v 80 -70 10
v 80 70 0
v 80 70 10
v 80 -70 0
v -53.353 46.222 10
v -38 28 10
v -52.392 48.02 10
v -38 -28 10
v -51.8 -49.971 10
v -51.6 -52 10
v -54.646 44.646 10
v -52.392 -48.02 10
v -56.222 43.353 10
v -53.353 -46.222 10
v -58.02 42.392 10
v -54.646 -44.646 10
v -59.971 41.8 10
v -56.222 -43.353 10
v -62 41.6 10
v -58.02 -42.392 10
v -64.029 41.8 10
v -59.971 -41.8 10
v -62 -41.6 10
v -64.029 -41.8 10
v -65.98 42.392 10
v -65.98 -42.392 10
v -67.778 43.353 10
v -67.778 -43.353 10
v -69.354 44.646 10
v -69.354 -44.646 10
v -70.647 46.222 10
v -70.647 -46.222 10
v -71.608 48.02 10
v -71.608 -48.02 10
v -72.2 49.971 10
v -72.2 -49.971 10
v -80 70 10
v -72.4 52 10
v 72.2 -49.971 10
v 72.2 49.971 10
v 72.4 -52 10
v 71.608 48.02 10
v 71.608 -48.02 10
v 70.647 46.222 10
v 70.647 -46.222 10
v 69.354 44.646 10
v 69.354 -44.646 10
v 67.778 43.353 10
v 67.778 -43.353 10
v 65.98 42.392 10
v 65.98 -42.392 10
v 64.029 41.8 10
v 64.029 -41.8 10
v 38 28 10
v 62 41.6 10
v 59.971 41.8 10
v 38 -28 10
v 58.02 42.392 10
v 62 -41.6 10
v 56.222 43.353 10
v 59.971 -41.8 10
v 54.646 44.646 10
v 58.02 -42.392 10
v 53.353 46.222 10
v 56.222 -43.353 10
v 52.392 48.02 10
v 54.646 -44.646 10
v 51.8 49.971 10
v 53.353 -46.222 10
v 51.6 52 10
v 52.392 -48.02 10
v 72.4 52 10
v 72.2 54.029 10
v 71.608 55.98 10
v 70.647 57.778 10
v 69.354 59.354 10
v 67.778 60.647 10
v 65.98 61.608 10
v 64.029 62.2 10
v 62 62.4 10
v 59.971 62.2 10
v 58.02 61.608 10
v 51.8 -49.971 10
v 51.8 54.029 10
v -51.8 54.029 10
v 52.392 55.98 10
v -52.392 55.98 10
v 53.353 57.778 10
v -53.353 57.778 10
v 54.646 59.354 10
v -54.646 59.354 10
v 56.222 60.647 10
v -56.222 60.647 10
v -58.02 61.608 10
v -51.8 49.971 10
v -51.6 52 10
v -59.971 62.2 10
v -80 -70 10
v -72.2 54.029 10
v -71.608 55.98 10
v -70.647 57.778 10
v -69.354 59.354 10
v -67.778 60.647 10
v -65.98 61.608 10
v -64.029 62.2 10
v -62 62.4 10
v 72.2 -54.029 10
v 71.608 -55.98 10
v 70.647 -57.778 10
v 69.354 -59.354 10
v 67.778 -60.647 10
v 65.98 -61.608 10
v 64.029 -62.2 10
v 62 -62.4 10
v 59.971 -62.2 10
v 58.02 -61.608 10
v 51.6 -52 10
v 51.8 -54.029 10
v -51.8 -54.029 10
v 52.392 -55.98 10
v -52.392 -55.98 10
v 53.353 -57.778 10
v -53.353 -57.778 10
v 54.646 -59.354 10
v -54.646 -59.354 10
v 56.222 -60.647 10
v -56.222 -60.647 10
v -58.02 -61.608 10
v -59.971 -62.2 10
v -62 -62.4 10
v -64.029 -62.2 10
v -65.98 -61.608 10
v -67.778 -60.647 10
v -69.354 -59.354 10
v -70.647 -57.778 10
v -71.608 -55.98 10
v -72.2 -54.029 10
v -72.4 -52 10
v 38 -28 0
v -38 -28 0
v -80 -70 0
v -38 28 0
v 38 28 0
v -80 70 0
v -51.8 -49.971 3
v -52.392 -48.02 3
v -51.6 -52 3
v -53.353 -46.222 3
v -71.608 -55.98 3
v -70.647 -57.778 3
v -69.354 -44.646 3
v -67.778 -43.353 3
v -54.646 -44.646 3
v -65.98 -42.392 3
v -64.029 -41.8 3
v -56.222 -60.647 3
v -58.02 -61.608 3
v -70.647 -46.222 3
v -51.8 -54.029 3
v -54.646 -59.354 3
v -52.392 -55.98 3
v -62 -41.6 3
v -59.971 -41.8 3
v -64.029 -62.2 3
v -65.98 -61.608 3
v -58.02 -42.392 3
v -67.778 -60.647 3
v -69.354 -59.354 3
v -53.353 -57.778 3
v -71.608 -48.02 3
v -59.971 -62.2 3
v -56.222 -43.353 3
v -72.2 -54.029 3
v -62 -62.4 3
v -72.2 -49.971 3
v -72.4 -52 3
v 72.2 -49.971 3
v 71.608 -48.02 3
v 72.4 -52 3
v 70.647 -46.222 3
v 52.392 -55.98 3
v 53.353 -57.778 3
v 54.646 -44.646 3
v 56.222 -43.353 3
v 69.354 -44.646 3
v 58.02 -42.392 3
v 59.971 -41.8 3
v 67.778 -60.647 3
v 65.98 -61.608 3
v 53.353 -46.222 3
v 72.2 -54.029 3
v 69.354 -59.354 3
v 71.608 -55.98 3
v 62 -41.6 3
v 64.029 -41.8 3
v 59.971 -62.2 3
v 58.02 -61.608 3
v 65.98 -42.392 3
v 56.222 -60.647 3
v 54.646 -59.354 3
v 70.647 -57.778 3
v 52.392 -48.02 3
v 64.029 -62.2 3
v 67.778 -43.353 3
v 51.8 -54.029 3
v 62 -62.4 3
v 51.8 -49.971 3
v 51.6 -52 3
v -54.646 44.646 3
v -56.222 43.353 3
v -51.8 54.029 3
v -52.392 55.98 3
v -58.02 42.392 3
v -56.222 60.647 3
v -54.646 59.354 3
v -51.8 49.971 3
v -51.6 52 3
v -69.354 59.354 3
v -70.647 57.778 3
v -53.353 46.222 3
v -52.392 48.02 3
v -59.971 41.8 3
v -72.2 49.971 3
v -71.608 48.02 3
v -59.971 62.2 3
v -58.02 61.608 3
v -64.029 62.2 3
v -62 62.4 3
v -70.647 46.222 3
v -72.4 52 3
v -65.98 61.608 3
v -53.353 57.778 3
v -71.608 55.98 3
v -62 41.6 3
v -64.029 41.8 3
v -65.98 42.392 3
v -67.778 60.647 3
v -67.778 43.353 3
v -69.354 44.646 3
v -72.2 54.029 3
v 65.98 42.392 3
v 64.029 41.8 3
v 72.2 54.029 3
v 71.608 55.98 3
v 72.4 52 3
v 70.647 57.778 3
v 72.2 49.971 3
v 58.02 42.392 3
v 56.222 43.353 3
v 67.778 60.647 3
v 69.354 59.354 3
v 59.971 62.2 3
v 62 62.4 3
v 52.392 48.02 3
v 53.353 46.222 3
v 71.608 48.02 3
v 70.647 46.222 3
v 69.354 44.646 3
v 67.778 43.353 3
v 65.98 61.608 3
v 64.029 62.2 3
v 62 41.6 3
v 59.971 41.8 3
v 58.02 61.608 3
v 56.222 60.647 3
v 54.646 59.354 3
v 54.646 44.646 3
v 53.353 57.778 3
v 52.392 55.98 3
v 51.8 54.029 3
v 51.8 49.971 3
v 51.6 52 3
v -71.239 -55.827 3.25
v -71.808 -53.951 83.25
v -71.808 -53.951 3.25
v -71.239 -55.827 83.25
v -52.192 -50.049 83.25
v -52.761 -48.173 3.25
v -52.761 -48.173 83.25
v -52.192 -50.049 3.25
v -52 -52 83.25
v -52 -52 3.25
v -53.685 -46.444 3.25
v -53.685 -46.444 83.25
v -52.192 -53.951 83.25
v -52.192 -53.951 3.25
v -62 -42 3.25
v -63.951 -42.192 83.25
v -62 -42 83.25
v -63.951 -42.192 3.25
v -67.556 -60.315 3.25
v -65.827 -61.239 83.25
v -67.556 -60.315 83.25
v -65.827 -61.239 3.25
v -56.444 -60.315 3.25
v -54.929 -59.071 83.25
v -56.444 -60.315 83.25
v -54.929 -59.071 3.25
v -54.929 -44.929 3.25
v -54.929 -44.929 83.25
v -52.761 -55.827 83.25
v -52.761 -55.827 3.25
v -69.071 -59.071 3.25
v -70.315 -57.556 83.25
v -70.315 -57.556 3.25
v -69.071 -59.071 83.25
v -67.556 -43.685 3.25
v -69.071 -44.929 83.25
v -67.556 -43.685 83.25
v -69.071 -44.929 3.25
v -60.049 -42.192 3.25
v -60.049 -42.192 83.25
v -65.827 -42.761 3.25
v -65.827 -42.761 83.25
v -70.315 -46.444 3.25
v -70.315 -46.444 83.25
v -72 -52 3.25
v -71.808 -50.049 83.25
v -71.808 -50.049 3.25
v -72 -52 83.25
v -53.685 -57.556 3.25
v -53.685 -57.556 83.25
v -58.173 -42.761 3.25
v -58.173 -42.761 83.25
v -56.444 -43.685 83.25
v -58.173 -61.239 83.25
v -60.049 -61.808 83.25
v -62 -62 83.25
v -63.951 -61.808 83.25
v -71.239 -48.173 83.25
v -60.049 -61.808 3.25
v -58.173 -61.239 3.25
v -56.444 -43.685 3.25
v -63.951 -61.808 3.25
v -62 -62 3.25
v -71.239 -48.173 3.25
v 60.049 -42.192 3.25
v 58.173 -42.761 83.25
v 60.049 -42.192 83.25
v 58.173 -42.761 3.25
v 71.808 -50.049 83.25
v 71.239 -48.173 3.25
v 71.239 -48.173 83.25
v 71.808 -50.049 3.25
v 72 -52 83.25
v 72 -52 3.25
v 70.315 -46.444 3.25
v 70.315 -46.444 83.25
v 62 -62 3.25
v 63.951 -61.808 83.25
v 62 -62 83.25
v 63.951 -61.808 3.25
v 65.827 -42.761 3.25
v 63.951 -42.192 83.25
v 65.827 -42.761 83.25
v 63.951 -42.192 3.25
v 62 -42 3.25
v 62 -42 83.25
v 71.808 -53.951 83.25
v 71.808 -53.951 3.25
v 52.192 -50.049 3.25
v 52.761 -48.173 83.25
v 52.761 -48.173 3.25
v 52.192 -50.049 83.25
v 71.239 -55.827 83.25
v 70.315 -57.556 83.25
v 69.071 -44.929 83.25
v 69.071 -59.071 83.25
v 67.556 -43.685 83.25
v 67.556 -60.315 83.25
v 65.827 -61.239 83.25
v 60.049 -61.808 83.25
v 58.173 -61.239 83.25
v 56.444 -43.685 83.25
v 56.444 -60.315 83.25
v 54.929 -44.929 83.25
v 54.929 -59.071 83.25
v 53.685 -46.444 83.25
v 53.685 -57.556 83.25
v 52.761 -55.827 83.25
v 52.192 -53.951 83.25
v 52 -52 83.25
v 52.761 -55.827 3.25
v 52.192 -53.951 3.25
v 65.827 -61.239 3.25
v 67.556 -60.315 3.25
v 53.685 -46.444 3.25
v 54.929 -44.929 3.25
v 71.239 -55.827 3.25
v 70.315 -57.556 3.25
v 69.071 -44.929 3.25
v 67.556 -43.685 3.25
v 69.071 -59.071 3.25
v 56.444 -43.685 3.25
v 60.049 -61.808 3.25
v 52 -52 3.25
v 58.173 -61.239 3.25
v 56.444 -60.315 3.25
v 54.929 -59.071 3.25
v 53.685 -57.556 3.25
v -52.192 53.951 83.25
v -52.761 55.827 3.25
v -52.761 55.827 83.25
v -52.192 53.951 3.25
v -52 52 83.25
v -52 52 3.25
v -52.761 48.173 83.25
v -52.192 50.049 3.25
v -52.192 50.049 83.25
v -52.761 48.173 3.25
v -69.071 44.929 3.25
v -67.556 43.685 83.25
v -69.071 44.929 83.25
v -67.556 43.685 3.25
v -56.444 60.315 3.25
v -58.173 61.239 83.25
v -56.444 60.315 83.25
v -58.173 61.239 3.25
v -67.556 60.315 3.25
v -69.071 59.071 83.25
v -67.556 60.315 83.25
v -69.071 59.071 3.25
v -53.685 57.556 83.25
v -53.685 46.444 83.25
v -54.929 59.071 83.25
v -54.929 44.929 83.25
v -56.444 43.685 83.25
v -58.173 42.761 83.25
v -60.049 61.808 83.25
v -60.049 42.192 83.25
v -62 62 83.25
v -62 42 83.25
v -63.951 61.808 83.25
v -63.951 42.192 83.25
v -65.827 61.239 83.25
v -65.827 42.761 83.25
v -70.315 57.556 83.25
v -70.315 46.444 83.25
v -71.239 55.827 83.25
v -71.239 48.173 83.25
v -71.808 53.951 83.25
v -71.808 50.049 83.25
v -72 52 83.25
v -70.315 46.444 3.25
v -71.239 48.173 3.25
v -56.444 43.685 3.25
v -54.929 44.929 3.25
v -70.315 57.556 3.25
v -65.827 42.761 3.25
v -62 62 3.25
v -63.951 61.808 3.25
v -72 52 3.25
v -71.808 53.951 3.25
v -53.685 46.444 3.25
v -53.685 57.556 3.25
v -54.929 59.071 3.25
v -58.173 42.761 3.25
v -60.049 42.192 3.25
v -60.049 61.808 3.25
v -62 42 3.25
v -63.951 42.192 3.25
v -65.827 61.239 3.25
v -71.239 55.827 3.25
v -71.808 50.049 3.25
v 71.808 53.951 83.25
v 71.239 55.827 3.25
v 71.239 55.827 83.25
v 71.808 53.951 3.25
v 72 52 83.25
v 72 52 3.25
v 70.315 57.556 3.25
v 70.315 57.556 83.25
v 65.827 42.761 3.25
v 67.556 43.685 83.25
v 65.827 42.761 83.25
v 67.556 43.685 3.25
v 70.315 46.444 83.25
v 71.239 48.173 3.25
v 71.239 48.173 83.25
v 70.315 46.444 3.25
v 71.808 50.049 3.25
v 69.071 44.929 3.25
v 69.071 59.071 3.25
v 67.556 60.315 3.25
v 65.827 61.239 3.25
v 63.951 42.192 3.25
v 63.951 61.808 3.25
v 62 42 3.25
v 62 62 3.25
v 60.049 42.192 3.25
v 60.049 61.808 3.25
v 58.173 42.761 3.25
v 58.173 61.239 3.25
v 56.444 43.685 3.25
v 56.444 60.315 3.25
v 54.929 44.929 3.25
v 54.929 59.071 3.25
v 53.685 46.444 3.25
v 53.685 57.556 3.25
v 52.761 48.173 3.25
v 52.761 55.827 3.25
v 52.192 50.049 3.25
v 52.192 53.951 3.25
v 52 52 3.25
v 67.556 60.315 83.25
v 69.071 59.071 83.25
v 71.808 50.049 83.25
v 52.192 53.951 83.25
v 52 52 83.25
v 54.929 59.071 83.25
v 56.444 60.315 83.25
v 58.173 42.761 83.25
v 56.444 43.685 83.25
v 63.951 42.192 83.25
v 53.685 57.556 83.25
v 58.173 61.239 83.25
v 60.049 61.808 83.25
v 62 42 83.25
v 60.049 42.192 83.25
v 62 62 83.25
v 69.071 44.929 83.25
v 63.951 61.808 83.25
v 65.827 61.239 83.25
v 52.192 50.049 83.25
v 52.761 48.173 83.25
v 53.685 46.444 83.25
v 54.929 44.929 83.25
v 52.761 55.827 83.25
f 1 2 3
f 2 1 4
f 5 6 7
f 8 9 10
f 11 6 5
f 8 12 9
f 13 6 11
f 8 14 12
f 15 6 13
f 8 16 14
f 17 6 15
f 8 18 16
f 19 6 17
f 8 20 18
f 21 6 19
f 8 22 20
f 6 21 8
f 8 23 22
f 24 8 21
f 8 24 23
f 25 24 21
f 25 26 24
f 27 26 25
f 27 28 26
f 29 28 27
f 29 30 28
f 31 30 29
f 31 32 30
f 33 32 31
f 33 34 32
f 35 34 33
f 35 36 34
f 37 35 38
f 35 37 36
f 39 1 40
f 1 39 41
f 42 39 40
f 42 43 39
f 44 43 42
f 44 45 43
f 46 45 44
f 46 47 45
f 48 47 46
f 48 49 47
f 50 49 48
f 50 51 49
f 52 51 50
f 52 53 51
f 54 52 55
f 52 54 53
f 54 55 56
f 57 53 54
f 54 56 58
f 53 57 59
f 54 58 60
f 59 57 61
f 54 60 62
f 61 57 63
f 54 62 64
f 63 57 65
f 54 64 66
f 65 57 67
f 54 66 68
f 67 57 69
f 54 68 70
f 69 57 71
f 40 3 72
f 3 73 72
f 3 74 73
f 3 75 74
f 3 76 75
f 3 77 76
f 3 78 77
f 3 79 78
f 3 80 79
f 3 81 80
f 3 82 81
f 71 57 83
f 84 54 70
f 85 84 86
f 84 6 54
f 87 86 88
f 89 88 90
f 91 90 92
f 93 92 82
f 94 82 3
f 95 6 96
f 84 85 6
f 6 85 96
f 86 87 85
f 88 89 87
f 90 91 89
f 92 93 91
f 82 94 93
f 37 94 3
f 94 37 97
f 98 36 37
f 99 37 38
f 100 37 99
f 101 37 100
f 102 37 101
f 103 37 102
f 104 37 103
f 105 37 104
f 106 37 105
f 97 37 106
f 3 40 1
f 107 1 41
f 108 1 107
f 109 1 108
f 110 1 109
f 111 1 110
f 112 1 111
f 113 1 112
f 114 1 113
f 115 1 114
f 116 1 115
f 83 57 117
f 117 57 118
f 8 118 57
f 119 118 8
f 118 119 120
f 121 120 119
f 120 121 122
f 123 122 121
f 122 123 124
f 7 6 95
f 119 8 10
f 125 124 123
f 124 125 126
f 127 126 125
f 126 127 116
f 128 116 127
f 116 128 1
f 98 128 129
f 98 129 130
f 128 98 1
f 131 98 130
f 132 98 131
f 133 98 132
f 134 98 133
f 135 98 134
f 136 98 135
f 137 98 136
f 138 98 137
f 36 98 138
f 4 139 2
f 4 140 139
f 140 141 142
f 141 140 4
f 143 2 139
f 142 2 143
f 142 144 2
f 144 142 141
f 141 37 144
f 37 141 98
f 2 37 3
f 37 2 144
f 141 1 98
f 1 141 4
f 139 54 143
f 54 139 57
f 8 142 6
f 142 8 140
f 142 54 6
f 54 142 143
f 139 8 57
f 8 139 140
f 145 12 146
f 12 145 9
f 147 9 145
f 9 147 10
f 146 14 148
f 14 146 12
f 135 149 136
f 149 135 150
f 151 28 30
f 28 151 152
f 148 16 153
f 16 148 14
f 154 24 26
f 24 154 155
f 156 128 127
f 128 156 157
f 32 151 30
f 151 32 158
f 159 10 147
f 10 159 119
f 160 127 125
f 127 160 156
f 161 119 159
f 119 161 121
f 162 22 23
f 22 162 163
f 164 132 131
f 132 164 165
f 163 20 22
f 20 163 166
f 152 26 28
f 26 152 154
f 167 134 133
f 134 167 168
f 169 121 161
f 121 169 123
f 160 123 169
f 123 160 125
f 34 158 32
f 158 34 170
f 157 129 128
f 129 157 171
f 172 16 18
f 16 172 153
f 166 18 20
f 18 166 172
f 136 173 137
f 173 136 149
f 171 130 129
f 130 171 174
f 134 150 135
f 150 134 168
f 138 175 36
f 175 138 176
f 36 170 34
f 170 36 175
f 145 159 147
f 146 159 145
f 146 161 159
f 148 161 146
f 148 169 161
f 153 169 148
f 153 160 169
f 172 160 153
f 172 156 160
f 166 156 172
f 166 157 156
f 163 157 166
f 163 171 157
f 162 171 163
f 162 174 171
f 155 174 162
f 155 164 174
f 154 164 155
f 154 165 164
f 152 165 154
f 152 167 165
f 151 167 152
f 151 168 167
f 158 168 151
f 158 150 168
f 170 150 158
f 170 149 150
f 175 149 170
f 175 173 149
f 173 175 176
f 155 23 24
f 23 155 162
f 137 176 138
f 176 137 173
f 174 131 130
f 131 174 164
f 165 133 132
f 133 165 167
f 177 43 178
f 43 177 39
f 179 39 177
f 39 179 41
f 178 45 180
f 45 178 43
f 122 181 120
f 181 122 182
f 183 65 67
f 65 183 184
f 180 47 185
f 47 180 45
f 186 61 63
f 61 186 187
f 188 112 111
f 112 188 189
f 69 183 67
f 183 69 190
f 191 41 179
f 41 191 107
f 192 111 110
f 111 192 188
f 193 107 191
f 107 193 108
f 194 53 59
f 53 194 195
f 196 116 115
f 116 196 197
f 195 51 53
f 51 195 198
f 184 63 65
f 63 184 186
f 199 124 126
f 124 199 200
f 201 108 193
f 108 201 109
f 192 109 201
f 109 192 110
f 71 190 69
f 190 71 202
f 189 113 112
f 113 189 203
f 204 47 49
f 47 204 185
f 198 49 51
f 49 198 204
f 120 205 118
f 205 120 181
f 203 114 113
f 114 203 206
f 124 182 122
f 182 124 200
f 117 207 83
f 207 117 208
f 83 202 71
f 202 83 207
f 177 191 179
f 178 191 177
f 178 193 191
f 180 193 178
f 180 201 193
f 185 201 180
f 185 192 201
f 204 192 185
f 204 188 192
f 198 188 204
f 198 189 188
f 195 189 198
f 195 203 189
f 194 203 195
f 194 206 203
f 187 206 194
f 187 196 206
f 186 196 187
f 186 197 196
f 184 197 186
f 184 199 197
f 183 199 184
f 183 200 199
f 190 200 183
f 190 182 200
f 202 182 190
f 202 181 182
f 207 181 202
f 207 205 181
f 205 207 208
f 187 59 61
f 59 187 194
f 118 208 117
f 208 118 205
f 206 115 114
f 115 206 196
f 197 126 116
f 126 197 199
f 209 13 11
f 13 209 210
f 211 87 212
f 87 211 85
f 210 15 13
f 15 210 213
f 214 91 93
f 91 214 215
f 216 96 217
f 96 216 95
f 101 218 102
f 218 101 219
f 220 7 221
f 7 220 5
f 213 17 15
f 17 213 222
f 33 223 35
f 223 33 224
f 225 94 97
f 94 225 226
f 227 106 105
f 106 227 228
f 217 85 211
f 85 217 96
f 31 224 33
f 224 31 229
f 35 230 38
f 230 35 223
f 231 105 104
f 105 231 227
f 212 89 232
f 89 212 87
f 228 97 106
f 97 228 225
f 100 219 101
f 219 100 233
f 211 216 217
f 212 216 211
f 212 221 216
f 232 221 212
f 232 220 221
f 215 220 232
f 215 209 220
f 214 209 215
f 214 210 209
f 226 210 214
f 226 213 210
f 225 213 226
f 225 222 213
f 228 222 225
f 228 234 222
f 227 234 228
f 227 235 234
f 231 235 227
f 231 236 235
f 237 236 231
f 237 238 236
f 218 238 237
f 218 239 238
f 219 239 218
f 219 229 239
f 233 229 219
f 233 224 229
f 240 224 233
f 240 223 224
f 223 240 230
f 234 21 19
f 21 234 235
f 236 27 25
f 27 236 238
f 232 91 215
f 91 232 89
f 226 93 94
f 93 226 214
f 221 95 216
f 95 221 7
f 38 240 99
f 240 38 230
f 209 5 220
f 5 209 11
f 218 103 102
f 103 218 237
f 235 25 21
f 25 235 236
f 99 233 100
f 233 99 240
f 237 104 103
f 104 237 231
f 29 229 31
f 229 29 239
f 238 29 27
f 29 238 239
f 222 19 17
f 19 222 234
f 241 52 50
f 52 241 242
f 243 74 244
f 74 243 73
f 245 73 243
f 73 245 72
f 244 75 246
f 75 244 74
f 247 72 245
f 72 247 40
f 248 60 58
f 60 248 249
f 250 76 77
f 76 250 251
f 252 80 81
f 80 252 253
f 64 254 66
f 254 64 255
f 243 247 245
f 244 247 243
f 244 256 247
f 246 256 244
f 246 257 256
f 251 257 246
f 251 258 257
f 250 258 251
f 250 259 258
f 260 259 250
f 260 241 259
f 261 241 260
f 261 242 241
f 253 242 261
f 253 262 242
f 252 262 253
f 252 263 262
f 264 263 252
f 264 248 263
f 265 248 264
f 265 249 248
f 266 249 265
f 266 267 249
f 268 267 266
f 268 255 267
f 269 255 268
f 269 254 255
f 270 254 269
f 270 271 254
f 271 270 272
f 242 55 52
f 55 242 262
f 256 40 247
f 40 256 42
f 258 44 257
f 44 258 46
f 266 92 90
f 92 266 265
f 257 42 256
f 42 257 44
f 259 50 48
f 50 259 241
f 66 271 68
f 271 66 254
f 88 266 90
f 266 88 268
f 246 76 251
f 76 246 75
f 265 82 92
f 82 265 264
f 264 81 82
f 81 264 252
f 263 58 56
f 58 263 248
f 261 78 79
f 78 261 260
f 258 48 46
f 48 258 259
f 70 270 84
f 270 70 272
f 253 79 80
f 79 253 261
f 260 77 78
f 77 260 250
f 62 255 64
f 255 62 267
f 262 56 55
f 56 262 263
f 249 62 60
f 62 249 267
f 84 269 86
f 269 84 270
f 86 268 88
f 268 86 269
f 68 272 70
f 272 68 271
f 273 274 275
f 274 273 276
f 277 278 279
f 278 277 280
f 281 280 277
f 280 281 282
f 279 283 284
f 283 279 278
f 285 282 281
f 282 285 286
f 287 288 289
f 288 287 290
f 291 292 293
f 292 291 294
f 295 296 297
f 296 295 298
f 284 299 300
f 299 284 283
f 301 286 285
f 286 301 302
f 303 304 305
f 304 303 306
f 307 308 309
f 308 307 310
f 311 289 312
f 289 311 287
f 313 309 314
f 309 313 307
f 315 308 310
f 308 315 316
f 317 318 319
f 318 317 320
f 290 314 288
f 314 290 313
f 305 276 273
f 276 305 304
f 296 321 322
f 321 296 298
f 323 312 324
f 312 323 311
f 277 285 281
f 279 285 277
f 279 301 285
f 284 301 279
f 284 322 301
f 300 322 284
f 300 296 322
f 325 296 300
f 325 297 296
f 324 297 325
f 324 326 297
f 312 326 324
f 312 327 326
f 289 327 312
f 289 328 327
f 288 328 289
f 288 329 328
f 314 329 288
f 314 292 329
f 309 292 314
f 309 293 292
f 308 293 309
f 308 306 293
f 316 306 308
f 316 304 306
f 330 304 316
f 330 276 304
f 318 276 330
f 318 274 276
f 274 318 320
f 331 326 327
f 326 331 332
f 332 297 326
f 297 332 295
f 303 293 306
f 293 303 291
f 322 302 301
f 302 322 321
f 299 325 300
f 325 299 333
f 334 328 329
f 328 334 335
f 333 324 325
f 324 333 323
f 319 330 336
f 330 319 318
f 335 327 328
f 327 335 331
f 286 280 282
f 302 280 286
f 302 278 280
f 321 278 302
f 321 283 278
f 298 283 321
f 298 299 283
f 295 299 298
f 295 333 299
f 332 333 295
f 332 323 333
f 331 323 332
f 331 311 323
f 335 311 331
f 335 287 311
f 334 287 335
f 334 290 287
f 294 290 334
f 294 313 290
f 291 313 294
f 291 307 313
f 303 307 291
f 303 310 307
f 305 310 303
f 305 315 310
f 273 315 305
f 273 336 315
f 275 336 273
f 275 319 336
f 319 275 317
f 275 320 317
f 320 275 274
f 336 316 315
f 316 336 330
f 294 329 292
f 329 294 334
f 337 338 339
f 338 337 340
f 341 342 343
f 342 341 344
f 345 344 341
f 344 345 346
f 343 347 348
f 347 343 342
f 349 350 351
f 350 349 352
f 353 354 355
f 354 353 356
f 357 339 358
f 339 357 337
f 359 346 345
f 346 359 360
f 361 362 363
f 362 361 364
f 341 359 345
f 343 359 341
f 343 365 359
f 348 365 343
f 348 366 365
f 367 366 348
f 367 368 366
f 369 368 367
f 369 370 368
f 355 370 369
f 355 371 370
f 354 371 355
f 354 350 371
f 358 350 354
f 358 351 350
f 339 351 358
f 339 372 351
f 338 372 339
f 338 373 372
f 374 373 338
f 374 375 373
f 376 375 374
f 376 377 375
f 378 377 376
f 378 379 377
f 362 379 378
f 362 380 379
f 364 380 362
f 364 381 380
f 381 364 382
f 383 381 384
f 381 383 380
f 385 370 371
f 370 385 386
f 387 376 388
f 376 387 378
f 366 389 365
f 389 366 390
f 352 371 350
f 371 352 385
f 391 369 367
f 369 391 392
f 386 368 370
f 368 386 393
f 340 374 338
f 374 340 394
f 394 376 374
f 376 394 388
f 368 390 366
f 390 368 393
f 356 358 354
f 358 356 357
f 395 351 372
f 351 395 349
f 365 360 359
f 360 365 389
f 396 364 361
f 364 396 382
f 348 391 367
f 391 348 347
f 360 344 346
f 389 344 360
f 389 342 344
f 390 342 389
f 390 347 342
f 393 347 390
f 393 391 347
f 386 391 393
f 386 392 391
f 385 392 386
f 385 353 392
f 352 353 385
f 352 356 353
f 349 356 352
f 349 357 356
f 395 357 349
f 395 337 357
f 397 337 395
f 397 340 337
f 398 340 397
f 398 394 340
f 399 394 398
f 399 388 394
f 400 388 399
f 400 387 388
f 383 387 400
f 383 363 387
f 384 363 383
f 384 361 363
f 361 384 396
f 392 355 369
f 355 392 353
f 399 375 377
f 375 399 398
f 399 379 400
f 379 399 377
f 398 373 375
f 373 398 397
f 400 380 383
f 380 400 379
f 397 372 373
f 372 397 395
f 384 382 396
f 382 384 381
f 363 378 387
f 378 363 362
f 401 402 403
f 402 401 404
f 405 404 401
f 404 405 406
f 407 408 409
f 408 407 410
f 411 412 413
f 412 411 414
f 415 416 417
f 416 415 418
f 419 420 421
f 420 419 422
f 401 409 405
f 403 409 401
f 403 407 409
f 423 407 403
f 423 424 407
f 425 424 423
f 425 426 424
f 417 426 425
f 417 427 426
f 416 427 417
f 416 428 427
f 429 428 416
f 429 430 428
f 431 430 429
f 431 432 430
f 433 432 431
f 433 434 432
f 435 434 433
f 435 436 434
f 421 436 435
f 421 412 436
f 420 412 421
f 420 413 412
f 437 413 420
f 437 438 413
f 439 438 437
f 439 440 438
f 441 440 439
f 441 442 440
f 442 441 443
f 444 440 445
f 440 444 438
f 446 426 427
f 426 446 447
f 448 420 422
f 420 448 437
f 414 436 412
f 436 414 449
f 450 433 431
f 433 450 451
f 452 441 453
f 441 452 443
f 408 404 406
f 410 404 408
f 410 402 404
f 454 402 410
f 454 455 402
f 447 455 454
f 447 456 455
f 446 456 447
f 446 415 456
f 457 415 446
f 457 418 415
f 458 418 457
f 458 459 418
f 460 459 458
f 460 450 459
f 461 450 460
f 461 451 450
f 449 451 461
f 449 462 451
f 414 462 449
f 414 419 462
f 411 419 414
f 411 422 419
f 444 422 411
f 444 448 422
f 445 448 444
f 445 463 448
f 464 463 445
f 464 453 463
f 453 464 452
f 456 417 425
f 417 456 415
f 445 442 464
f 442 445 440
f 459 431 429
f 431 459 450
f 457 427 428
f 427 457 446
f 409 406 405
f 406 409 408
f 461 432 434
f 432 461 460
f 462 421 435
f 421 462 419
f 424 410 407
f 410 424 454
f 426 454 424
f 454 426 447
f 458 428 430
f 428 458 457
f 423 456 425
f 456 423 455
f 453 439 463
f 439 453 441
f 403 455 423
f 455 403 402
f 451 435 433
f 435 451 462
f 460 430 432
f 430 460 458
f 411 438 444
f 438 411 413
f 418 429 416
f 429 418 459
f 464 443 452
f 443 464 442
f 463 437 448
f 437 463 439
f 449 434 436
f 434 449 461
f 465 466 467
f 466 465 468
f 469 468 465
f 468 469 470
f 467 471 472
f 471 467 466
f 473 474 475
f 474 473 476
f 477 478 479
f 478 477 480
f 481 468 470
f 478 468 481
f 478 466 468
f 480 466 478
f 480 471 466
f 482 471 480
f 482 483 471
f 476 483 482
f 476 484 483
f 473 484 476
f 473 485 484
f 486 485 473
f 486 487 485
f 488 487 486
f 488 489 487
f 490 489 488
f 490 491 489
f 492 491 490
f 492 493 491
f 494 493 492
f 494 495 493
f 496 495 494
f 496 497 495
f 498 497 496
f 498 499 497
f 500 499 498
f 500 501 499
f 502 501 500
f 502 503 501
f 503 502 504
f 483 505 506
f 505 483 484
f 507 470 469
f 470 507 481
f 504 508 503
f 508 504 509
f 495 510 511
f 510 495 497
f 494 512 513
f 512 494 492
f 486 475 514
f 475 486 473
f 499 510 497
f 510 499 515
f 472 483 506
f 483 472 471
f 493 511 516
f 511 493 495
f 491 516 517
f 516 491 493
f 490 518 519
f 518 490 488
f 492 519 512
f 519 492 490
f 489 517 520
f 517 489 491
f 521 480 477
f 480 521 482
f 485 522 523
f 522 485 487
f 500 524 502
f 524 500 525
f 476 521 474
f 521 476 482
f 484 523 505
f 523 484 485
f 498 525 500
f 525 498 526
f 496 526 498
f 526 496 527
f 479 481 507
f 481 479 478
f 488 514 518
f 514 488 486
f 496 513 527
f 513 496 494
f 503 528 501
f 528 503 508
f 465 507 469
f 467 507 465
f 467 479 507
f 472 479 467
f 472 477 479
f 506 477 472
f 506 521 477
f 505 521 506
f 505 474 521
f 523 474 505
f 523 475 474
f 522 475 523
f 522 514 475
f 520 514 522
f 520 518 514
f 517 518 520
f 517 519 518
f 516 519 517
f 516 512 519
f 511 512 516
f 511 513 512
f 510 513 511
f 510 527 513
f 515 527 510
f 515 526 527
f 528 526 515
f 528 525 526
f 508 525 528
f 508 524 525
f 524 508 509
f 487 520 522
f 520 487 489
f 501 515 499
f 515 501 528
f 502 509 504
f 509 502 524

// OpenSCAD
$fn = 32;

// ------------------------------------------------------------------------
// Frame with four posts: 160 x 140 mm frame, four d20 posts
// Every part is its own module, assembly() places them once.
// ------------------------------------------------------------------------

// --- part 1 ---
module base_frame() {
  difference() {
    translate([-80, -70, 0]) cube([160, 140, 10]);
    translate([-38, -28, -1]) cube([76, 56, 12]);
    translate([-62, -52, 3]) cylinder(h = 8, d = 20.8);
    translate([62, -52, 3]) cylinder(h = 8, d = 20.8);
    translate([-62, 52, 3]) cylinder(h = 8, d = 20.8);
    translate([62, 52, 3]) cylinder(h = 8, d = 20.8);
  }
}

// --- part 2 ---
module post1() {
  cylinder(h = 80, d = 20);
}

// --- part 3 ---
module post2() {
  cylinder(h = 80, d = 20);
}

// --- part 4 ---
module post3() {
  cylinder(h = 80, d = 20);
}

// --- part 5 ---
module post4() {
  cylinder(h = 80, d = 20);
}

// --- assembly ---
module assembly() {
  translate([0, 0, 0]) rotate([0, 0, 0]) base_frame();
  translate([-62, -52, 3.25]) rotate([0, 0, 0]) post1();
  translate([62, -52, 3.25]) rotate([0, 0, 0]) post2();
  translate([-62, 52, 3.25]) rotate([0, 0, 0]) post3();
  translate([62, 52, 3.25]) rotate([0, 0, 0]) post4();
}

assembly();
